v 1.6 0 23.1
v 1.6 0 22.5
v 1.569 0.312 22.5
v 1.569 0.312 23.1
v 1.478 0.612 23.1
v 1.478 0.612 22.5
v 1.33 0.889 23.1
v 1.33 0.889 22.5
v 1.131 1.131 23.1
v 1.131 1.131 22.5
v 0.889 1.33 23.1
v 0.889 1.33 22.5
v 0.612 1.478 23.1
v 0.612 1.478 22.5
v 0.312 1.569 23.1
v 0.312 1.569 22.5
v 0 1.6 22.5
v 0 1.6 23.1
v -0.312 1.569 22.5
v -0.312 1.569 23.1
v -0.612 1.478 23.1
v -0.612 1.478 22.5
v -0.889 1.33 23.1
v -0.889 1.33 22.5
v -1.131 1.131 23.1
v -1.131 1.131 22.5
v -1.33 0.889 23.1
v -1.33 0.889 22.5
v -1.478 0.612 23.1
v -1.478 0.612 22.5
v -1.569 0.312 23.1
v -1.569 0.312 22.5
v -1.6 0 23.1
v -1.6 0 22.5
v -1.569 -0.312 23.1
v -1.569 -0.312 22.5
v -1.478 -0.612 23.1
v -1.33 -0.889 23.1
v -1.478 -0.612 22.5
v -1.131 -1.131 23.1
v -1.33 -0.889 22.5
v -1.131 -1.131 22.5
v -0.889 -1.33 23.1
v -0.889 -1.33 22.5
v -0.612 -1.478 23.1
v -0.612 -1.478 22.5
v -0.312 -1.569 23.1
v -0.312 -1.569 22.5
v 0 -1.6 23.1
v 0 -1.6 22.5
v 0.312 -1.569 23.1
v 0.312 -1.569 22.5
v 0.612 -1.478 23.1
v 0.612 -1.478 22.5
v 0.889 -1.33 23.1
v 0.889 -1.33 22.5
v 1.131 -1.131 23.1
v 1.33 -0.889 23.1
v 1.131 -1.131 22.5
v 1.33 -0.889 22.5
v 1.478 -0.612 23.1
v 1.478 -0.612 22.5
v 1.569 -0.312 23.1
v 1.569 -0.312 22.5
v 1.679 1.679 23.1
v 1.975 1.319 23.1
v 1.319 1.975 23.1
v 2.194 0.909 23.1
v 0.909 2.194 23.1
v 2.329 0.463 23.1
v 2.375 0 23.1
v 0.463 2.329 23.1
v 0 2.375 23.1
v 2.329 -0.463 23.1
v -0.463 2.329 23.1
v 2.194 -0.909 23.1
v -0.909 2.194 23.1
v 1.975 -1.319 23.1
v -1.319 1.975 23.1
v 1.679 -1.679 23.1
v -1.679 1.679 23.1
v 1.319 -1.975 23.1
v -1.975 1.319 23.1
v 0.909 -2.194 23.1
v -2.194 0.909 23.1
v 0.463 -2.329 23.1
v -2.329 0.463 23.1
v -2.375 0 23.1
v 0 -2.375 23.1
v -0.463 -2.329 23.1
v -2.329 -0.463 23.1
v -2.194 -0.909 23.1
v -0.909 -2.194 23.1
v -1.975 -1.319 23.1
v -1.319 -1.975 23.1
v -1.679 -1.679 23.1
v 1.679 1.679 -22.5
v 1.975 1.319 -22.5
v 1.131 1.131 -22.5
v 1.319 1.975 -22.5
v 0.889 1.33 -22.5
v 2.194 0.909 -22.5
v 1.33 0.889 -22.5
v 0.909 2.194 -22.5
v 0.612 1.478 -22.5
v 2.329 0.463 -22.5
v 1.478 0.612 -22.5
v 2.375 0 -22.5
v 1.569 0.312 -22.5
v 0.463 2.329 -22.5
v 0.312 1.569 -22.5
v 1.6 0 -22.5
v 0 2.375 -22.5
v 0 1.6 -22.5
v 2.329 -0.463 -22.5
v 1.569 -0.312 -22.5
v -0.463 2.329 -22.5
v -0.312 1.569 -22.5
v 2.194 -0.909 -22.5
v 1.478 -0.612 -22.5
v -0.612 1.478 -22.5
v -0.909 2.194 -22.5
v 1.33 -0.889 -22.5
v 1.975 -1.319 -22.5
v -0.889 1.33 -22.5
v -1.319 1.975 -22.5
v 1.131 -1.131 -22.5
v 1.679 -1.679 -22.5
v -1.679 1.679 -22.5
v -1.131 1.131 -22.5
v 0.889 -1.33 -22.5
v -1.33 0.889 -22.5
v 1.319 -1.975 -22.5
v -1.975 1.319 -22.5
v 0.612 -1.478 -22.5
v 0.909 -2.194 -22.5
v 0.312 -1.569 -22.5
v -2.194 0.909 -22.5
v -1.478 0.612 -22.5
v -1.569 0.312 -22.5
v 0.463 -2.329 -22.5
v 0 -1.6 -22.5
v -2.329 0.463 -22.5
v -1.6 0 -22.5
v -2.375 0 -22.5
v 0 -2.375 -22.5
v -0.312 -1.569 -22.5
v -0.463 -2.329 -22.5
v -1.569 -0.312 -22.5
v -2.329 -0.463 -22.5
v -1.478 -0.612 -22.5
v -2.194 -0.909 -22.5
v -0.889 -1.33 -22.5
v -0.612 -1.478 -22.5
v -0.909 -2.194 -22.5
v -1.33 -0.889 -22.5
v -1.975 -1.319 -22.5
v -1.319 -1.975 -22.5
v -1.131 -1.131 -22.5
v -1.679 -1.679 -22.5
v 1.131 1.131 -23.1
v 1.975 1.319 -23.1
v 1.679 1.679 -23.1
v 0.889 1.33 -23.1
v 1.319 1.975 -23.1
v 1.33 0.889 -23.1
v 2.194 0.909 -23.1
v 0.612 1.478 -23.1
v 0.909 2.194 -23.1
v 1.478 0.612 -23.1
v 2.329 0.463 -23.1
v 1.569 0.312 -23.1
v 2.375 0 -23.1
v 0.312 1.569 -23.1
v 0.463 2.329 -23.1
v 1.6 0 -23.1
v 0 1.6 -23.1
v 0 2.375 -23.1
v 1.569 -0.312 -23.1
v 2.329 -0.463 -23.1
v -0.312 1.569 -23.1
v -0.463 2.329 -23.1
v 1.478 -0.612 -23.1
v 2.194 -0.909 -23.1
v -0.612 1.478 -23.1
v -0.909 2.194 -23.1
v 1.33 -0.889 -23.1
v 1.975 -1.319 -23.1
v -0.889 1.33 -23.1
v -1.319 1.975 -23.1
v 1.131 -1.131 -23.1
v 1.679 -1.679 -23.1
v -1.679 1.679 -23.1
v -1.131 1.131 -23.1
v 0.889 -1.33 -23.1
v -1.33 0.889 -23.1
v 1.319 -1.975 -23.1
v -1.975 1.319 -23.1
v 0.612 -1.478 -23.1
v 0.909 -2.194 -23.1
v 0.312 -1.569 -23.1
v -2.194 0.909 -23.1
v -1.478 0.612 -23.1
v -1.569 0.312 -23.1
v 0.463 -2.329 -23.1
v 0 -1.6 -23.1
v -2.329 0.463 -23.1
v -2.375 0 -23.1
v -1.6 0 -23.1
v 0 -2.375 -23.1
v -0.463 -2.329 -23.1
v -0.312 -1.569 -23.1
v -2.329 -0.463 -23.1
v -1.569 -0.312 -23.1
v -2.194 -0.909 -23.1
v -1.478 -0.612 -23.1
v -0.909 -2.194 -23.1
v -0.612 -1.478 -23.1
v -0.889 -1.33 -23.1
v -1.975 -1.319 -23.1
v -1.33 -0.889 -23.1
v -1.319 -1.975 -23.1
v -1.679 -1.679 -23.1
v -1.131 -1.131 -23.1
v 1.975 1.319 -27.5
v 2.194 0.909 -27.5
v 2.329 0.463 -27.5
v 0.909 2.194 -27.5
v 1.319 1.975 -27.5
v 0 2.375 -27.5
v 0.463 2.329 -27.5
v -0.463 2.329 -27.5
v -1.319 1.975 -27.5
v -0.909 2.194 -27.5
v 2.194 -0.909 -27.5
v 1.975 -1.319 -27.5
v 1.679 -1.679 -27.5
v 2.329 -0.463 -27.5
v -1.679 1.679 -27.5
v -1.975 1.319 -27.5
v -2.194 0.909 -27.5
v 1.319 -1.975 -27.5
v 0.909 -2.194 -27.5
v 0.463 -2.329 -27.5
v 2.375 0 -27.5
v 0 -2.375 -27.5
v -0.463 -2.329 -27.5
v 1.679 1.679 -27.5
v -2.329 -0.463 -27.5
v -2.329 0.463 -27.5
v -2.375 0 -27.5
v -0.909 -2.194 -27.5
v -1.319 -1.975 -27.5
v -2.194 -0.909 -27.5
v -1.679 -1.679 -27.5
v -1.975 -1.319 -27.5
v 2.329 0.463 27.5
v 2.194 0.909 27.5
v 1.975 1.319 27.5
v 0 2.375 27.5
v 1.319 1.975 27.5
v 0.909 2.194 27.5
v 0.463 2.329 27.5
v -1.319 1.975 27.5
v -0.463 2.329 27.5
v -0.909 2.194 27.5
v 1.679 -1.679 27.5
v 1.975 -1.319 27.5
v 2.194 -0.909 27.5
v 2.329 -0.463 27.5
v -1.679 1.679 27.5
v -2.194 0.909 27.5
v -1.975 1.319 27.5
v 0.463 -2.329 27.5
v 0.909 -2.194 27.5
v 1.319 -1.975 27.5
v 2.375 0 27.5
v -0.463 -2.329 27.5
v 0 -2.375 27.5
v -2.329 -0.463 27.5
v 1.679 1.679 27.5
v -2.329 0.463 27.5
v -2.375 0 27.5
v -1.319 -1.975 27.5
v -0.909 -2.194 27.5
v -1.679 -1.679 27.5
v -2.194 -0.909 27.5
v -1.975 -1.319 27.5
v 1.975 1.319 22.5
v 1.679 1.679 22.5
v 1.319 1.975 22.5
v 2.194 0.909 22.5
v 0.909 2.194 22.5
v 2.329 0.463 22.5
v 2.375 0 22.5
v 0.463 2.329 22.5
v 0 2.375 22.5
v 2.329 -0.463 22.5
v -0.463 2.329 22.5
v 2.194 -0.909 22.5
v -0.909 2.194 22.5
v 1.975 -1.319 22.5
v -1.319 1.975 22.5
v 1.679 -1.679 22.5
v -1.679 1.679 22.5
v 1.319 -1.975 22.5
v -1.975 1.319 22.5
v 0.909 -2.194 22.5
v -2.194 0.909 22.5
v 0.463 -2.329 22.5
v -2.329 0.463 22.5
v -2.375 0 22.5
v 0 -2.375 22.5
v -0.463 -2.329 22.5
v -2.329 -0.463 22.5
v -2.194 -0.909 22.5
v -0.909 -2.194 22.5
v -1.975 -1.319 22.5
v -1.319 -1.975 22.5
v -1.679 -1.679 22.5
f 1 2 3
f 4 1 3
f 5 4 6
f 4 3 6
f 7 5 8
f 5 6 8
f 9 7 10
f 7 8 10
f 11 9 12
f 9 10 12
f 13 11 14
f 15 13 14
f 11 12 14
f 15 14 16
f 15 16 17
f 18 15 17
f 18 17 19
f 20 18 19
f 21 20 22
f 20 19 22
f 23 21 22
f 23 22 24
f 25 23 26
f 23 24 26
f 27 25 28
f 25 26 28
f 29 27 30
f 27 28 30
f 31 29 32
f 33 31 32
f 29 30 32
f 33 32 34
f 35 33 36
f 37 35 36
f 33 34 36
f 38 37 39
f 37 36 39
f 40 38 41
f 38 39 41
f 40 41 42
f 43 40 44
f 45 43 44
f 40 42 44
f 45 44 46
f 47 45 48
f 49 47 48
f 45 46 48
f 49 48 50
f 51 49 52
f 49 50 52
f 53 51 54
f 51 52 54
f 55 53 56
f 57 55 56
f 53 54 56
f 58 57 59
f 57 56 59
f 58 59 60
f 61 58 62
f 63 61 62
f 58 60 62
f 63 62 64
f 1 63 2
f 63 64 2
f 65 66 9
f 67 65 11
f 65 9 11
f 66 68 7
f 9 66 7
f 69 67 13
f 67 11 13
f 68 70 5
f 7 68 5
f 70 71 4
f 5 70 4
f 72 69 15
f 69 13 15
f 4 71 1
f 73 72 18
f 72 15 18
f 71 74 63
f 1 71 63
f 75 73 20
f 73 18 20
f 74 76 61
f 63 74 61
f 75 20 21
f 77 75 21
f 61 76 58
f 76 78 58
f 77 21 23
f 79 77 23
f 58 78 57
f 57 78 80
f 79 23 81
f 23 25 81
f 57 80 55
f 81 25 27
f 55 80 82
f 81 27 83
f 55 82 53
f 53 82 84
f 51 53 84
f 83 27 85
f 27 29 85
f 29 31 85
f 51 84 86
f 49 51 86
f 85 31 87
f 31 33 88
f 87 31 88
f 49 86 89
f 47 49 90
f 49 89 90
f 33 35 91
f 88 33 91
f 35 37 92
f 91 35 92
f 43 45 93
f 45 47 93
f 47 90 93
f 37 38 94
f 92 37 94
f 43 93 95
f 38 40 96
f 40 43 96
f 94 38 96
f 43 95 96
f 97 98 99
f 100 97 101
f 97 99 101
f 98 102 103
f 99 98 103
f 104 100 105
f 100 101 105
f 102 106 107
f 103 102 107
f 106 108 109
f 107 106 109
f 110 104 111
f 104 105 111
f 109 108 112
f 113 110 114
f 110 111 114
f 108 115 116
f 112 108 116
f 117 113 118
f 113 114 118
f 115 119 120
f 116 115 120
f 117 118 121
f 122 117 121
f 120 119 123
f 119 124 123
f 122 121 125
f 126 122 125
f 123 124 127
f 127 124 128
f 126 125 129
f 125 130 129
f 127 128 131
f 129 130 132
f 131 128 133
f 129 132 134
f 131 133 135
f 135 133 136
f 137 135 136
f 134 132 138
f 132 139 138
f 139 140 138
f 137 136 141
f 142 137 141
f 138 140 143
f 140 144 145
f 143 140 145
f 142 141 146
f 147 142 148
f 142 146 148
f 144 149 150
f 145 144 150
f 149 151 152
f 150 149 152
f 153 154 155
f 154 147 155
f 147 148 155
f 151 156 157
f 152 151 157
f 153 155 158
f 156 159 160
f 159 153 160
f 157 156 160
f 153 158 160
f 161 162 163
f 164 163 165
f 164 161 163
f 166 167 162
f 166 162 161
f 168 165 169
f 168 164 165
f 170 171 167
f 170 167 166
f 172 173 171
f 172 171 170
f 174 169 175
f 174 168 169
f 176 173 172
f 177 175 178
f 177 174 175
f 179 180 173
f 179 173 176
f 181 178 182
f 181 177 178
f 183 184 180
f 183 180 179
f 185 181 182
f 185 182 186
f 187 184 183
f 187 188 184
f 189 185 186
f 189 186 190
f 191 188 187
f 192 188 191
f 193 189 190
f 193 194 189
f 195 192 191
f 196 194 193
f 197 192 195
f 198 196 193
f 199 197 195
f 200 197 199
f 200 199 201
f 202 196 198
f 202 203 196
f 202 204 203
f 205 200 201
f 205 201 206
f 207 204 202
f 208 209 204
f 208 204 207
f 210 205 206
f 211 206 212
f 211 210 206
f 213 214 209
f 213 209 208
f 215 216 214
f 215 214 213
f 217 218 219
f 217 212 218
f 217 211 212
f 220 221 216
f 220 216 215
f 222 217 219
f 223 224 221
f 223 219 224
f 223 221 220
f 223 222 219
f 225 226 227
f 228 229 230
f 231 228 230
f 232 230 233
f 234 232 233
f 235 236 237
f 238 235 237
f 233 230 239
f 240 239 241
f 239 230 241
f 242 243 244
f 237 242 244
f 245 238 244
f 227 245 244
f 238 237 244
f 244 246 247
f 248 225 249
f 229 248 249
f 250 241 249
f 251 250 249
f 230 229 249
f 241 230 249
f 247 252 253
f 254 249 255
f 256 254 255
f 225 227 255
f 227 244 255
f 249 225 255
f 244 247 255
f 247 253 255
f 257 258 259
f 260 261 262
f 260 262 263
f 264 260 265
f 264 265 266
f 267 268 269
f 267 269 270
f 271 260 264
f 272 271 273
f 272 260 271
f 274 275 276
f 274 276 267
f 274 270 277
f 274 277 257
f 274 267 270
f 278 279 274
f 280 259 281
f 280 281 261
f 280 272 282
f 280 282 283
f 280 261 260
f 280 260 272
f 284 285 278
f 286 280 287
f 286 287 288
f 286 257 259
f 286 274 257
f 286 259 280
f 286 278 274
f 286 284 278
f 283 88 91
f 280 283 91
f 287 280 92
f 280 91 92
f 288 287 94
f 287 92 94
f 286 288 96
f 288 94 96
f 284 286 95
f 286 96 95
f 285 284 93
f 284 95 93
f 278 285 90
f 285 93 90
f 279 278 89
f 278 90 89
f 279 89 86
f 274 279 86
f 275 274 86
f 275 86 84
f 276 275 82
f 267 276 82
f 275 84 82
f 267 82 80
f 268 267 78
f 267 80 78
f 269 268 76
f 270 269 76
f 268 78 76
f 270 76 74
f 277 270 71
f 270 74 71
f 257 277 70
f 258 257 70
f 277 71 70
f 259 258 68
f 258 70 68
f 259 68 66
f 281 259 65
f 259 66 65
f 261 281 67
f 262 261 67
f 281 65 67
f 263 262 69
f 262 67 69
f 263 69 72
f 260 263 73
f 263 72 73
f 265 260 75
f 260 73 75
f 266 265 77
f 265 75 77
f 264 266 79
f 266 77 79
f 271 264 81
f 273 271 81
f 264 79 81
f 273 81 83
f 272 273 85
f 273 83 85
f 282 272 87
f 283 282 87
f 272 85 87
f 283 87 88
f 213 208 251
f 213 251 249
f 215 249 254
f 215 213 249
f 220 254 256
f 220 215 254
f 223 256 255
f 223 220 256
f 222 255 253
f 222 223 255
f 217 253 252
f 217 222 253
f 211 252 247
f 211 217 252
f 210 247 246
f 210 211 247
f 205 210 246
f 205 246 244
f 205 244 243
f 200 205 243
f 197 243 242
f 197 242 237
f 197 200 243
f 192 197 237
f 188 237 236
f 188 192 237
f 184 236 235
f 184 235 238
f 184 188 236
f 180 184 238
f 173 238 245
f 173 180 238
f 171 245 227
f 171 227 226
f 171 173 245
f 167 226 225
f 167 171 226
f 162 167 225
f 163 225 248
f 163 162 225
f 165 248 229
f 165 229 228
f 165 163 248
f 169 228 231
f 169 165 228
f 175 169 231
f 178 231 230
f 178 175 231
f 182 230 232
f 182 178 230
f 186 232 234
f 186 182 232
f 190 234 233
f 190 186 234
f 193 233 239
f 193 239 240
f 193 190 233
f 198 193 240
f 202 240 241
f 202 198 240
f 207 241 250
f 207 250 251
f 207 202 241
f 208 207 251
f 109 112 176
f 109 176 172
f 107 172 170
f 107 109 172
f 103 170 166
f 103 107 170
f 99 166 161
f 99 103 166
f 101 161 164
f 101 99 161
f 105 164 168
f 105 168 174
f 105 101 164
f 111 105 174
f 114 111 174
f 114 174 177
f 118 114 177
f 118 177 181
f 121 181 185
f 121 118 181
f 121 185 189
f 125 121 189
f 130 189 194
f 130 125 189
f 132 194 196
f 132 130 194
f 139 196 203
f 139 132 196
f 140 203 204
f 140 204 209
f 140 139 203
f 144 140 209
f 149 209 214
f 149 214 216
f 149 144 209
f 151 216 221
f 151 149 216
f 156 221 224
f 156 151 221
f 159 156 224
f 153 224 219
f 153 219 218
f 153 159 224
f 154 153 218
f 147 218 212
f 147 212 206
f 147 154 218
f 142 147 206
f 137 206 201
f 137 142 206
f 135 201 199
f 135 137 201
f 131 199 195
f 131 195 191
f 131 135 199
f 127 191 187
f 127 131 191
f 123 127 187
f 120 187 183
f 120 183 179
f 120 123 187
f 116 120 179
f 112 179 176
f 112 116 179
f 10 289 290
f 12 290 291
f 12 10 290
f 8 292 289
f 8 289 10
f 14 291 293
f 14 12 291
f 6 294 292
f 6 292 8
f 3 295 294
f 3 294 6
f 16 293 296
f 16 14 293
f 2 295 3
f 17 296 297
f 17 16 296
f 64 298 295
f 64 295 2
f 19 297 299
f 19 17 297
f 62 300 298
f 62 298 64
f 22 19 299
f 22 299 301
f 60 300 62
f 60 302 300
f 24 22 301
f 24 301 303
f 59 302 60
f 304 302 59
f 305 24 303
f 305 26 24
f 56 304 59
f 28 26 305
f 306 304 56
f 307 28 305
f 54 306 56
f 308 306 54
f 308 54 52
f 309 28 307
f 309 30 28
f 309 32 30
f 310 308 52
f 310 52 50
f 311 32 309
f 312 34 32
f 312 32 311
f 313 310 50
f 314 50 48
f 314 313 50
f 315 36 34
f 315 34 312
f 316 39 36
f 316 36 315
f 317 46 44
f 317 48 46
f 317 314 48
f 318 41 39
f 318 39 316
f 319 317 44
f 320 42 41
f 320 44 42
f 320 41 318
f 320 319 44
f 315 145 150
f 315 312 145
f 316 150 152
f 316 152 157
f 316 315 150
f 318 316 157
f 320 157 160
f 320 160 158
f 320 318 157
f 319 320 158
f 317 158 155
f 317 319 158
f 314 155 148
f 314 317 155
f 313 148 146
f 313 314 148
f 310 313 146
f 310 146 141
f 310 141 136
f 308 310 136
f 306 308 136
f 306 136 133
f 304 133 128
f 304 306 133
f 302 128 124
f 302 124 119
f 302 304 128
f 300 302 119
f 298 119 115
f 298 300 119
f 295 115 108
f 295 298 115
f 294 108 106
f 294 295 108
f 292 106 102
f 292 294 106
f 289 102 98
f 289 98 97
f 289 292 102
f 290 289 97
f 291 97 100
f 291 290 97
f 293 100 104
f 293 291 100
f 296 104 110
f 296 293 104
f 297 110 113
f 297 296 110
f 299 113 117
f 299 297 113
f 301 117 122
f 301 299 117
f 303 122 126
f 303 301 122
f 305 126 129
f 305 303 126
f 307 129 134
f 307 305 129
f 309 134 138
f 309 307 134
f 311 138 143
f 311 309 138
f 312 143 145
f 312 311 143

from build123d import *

# Parameters (mm, degrees)
SKETCH1_R           = 2.375
BOSS_EXTRUDE1_DEPTH = 22.5
SKETCH2_R           = 1.6
BOSS_EXTRUDE2_DEPTH = 0.6
SKETCH3_R           = 2.375
BOSS_EXTRUDE3_DEPTH = 4.4


with BuildPart() as part:
    # Sketch1 → Boss-Extrude1 (new body)
    with BuildSketch(Plane.XY):
        with Locations(Location((0, 0, 0), (0, 0, 180))):
            Circle(SKETCH1_R)
    boss_extrude1 = extrude(amount=BOSS_EXTRUDE1_DEPTH)

    # Sketch2 → Boss-Extrude2 (add)
    with BuildSketch(Plane.XY.offset(22.5)):
        Circle(SKETCH2_R)
    boss_extrude2 = extrude(amount=BOSS_EXTRUDE2_DEPTH)

    # Sketch3 → Boss-Extrude3 (add)
    with BuildSketch(Plane.XY.offset(23.1)):
        with Locations(Location((0, 0, 0), (0, 0, 180))):
            Circle(SKETCH3_R)
    boss_extrude3 = extrude(amount=BOSS_EXTRUDE3_DEPTH)

    # Mirror1: Boss-Extrude1, Boss-Extrude2, Boss-Extrude3 across plane
    add(boss_extrude1.mirror(Plane.XY))
    add(boss_extrude2.mirror(Plane.XY))
    add(boss_extrude3.mirror(Plane.XY))


solid = part.part
